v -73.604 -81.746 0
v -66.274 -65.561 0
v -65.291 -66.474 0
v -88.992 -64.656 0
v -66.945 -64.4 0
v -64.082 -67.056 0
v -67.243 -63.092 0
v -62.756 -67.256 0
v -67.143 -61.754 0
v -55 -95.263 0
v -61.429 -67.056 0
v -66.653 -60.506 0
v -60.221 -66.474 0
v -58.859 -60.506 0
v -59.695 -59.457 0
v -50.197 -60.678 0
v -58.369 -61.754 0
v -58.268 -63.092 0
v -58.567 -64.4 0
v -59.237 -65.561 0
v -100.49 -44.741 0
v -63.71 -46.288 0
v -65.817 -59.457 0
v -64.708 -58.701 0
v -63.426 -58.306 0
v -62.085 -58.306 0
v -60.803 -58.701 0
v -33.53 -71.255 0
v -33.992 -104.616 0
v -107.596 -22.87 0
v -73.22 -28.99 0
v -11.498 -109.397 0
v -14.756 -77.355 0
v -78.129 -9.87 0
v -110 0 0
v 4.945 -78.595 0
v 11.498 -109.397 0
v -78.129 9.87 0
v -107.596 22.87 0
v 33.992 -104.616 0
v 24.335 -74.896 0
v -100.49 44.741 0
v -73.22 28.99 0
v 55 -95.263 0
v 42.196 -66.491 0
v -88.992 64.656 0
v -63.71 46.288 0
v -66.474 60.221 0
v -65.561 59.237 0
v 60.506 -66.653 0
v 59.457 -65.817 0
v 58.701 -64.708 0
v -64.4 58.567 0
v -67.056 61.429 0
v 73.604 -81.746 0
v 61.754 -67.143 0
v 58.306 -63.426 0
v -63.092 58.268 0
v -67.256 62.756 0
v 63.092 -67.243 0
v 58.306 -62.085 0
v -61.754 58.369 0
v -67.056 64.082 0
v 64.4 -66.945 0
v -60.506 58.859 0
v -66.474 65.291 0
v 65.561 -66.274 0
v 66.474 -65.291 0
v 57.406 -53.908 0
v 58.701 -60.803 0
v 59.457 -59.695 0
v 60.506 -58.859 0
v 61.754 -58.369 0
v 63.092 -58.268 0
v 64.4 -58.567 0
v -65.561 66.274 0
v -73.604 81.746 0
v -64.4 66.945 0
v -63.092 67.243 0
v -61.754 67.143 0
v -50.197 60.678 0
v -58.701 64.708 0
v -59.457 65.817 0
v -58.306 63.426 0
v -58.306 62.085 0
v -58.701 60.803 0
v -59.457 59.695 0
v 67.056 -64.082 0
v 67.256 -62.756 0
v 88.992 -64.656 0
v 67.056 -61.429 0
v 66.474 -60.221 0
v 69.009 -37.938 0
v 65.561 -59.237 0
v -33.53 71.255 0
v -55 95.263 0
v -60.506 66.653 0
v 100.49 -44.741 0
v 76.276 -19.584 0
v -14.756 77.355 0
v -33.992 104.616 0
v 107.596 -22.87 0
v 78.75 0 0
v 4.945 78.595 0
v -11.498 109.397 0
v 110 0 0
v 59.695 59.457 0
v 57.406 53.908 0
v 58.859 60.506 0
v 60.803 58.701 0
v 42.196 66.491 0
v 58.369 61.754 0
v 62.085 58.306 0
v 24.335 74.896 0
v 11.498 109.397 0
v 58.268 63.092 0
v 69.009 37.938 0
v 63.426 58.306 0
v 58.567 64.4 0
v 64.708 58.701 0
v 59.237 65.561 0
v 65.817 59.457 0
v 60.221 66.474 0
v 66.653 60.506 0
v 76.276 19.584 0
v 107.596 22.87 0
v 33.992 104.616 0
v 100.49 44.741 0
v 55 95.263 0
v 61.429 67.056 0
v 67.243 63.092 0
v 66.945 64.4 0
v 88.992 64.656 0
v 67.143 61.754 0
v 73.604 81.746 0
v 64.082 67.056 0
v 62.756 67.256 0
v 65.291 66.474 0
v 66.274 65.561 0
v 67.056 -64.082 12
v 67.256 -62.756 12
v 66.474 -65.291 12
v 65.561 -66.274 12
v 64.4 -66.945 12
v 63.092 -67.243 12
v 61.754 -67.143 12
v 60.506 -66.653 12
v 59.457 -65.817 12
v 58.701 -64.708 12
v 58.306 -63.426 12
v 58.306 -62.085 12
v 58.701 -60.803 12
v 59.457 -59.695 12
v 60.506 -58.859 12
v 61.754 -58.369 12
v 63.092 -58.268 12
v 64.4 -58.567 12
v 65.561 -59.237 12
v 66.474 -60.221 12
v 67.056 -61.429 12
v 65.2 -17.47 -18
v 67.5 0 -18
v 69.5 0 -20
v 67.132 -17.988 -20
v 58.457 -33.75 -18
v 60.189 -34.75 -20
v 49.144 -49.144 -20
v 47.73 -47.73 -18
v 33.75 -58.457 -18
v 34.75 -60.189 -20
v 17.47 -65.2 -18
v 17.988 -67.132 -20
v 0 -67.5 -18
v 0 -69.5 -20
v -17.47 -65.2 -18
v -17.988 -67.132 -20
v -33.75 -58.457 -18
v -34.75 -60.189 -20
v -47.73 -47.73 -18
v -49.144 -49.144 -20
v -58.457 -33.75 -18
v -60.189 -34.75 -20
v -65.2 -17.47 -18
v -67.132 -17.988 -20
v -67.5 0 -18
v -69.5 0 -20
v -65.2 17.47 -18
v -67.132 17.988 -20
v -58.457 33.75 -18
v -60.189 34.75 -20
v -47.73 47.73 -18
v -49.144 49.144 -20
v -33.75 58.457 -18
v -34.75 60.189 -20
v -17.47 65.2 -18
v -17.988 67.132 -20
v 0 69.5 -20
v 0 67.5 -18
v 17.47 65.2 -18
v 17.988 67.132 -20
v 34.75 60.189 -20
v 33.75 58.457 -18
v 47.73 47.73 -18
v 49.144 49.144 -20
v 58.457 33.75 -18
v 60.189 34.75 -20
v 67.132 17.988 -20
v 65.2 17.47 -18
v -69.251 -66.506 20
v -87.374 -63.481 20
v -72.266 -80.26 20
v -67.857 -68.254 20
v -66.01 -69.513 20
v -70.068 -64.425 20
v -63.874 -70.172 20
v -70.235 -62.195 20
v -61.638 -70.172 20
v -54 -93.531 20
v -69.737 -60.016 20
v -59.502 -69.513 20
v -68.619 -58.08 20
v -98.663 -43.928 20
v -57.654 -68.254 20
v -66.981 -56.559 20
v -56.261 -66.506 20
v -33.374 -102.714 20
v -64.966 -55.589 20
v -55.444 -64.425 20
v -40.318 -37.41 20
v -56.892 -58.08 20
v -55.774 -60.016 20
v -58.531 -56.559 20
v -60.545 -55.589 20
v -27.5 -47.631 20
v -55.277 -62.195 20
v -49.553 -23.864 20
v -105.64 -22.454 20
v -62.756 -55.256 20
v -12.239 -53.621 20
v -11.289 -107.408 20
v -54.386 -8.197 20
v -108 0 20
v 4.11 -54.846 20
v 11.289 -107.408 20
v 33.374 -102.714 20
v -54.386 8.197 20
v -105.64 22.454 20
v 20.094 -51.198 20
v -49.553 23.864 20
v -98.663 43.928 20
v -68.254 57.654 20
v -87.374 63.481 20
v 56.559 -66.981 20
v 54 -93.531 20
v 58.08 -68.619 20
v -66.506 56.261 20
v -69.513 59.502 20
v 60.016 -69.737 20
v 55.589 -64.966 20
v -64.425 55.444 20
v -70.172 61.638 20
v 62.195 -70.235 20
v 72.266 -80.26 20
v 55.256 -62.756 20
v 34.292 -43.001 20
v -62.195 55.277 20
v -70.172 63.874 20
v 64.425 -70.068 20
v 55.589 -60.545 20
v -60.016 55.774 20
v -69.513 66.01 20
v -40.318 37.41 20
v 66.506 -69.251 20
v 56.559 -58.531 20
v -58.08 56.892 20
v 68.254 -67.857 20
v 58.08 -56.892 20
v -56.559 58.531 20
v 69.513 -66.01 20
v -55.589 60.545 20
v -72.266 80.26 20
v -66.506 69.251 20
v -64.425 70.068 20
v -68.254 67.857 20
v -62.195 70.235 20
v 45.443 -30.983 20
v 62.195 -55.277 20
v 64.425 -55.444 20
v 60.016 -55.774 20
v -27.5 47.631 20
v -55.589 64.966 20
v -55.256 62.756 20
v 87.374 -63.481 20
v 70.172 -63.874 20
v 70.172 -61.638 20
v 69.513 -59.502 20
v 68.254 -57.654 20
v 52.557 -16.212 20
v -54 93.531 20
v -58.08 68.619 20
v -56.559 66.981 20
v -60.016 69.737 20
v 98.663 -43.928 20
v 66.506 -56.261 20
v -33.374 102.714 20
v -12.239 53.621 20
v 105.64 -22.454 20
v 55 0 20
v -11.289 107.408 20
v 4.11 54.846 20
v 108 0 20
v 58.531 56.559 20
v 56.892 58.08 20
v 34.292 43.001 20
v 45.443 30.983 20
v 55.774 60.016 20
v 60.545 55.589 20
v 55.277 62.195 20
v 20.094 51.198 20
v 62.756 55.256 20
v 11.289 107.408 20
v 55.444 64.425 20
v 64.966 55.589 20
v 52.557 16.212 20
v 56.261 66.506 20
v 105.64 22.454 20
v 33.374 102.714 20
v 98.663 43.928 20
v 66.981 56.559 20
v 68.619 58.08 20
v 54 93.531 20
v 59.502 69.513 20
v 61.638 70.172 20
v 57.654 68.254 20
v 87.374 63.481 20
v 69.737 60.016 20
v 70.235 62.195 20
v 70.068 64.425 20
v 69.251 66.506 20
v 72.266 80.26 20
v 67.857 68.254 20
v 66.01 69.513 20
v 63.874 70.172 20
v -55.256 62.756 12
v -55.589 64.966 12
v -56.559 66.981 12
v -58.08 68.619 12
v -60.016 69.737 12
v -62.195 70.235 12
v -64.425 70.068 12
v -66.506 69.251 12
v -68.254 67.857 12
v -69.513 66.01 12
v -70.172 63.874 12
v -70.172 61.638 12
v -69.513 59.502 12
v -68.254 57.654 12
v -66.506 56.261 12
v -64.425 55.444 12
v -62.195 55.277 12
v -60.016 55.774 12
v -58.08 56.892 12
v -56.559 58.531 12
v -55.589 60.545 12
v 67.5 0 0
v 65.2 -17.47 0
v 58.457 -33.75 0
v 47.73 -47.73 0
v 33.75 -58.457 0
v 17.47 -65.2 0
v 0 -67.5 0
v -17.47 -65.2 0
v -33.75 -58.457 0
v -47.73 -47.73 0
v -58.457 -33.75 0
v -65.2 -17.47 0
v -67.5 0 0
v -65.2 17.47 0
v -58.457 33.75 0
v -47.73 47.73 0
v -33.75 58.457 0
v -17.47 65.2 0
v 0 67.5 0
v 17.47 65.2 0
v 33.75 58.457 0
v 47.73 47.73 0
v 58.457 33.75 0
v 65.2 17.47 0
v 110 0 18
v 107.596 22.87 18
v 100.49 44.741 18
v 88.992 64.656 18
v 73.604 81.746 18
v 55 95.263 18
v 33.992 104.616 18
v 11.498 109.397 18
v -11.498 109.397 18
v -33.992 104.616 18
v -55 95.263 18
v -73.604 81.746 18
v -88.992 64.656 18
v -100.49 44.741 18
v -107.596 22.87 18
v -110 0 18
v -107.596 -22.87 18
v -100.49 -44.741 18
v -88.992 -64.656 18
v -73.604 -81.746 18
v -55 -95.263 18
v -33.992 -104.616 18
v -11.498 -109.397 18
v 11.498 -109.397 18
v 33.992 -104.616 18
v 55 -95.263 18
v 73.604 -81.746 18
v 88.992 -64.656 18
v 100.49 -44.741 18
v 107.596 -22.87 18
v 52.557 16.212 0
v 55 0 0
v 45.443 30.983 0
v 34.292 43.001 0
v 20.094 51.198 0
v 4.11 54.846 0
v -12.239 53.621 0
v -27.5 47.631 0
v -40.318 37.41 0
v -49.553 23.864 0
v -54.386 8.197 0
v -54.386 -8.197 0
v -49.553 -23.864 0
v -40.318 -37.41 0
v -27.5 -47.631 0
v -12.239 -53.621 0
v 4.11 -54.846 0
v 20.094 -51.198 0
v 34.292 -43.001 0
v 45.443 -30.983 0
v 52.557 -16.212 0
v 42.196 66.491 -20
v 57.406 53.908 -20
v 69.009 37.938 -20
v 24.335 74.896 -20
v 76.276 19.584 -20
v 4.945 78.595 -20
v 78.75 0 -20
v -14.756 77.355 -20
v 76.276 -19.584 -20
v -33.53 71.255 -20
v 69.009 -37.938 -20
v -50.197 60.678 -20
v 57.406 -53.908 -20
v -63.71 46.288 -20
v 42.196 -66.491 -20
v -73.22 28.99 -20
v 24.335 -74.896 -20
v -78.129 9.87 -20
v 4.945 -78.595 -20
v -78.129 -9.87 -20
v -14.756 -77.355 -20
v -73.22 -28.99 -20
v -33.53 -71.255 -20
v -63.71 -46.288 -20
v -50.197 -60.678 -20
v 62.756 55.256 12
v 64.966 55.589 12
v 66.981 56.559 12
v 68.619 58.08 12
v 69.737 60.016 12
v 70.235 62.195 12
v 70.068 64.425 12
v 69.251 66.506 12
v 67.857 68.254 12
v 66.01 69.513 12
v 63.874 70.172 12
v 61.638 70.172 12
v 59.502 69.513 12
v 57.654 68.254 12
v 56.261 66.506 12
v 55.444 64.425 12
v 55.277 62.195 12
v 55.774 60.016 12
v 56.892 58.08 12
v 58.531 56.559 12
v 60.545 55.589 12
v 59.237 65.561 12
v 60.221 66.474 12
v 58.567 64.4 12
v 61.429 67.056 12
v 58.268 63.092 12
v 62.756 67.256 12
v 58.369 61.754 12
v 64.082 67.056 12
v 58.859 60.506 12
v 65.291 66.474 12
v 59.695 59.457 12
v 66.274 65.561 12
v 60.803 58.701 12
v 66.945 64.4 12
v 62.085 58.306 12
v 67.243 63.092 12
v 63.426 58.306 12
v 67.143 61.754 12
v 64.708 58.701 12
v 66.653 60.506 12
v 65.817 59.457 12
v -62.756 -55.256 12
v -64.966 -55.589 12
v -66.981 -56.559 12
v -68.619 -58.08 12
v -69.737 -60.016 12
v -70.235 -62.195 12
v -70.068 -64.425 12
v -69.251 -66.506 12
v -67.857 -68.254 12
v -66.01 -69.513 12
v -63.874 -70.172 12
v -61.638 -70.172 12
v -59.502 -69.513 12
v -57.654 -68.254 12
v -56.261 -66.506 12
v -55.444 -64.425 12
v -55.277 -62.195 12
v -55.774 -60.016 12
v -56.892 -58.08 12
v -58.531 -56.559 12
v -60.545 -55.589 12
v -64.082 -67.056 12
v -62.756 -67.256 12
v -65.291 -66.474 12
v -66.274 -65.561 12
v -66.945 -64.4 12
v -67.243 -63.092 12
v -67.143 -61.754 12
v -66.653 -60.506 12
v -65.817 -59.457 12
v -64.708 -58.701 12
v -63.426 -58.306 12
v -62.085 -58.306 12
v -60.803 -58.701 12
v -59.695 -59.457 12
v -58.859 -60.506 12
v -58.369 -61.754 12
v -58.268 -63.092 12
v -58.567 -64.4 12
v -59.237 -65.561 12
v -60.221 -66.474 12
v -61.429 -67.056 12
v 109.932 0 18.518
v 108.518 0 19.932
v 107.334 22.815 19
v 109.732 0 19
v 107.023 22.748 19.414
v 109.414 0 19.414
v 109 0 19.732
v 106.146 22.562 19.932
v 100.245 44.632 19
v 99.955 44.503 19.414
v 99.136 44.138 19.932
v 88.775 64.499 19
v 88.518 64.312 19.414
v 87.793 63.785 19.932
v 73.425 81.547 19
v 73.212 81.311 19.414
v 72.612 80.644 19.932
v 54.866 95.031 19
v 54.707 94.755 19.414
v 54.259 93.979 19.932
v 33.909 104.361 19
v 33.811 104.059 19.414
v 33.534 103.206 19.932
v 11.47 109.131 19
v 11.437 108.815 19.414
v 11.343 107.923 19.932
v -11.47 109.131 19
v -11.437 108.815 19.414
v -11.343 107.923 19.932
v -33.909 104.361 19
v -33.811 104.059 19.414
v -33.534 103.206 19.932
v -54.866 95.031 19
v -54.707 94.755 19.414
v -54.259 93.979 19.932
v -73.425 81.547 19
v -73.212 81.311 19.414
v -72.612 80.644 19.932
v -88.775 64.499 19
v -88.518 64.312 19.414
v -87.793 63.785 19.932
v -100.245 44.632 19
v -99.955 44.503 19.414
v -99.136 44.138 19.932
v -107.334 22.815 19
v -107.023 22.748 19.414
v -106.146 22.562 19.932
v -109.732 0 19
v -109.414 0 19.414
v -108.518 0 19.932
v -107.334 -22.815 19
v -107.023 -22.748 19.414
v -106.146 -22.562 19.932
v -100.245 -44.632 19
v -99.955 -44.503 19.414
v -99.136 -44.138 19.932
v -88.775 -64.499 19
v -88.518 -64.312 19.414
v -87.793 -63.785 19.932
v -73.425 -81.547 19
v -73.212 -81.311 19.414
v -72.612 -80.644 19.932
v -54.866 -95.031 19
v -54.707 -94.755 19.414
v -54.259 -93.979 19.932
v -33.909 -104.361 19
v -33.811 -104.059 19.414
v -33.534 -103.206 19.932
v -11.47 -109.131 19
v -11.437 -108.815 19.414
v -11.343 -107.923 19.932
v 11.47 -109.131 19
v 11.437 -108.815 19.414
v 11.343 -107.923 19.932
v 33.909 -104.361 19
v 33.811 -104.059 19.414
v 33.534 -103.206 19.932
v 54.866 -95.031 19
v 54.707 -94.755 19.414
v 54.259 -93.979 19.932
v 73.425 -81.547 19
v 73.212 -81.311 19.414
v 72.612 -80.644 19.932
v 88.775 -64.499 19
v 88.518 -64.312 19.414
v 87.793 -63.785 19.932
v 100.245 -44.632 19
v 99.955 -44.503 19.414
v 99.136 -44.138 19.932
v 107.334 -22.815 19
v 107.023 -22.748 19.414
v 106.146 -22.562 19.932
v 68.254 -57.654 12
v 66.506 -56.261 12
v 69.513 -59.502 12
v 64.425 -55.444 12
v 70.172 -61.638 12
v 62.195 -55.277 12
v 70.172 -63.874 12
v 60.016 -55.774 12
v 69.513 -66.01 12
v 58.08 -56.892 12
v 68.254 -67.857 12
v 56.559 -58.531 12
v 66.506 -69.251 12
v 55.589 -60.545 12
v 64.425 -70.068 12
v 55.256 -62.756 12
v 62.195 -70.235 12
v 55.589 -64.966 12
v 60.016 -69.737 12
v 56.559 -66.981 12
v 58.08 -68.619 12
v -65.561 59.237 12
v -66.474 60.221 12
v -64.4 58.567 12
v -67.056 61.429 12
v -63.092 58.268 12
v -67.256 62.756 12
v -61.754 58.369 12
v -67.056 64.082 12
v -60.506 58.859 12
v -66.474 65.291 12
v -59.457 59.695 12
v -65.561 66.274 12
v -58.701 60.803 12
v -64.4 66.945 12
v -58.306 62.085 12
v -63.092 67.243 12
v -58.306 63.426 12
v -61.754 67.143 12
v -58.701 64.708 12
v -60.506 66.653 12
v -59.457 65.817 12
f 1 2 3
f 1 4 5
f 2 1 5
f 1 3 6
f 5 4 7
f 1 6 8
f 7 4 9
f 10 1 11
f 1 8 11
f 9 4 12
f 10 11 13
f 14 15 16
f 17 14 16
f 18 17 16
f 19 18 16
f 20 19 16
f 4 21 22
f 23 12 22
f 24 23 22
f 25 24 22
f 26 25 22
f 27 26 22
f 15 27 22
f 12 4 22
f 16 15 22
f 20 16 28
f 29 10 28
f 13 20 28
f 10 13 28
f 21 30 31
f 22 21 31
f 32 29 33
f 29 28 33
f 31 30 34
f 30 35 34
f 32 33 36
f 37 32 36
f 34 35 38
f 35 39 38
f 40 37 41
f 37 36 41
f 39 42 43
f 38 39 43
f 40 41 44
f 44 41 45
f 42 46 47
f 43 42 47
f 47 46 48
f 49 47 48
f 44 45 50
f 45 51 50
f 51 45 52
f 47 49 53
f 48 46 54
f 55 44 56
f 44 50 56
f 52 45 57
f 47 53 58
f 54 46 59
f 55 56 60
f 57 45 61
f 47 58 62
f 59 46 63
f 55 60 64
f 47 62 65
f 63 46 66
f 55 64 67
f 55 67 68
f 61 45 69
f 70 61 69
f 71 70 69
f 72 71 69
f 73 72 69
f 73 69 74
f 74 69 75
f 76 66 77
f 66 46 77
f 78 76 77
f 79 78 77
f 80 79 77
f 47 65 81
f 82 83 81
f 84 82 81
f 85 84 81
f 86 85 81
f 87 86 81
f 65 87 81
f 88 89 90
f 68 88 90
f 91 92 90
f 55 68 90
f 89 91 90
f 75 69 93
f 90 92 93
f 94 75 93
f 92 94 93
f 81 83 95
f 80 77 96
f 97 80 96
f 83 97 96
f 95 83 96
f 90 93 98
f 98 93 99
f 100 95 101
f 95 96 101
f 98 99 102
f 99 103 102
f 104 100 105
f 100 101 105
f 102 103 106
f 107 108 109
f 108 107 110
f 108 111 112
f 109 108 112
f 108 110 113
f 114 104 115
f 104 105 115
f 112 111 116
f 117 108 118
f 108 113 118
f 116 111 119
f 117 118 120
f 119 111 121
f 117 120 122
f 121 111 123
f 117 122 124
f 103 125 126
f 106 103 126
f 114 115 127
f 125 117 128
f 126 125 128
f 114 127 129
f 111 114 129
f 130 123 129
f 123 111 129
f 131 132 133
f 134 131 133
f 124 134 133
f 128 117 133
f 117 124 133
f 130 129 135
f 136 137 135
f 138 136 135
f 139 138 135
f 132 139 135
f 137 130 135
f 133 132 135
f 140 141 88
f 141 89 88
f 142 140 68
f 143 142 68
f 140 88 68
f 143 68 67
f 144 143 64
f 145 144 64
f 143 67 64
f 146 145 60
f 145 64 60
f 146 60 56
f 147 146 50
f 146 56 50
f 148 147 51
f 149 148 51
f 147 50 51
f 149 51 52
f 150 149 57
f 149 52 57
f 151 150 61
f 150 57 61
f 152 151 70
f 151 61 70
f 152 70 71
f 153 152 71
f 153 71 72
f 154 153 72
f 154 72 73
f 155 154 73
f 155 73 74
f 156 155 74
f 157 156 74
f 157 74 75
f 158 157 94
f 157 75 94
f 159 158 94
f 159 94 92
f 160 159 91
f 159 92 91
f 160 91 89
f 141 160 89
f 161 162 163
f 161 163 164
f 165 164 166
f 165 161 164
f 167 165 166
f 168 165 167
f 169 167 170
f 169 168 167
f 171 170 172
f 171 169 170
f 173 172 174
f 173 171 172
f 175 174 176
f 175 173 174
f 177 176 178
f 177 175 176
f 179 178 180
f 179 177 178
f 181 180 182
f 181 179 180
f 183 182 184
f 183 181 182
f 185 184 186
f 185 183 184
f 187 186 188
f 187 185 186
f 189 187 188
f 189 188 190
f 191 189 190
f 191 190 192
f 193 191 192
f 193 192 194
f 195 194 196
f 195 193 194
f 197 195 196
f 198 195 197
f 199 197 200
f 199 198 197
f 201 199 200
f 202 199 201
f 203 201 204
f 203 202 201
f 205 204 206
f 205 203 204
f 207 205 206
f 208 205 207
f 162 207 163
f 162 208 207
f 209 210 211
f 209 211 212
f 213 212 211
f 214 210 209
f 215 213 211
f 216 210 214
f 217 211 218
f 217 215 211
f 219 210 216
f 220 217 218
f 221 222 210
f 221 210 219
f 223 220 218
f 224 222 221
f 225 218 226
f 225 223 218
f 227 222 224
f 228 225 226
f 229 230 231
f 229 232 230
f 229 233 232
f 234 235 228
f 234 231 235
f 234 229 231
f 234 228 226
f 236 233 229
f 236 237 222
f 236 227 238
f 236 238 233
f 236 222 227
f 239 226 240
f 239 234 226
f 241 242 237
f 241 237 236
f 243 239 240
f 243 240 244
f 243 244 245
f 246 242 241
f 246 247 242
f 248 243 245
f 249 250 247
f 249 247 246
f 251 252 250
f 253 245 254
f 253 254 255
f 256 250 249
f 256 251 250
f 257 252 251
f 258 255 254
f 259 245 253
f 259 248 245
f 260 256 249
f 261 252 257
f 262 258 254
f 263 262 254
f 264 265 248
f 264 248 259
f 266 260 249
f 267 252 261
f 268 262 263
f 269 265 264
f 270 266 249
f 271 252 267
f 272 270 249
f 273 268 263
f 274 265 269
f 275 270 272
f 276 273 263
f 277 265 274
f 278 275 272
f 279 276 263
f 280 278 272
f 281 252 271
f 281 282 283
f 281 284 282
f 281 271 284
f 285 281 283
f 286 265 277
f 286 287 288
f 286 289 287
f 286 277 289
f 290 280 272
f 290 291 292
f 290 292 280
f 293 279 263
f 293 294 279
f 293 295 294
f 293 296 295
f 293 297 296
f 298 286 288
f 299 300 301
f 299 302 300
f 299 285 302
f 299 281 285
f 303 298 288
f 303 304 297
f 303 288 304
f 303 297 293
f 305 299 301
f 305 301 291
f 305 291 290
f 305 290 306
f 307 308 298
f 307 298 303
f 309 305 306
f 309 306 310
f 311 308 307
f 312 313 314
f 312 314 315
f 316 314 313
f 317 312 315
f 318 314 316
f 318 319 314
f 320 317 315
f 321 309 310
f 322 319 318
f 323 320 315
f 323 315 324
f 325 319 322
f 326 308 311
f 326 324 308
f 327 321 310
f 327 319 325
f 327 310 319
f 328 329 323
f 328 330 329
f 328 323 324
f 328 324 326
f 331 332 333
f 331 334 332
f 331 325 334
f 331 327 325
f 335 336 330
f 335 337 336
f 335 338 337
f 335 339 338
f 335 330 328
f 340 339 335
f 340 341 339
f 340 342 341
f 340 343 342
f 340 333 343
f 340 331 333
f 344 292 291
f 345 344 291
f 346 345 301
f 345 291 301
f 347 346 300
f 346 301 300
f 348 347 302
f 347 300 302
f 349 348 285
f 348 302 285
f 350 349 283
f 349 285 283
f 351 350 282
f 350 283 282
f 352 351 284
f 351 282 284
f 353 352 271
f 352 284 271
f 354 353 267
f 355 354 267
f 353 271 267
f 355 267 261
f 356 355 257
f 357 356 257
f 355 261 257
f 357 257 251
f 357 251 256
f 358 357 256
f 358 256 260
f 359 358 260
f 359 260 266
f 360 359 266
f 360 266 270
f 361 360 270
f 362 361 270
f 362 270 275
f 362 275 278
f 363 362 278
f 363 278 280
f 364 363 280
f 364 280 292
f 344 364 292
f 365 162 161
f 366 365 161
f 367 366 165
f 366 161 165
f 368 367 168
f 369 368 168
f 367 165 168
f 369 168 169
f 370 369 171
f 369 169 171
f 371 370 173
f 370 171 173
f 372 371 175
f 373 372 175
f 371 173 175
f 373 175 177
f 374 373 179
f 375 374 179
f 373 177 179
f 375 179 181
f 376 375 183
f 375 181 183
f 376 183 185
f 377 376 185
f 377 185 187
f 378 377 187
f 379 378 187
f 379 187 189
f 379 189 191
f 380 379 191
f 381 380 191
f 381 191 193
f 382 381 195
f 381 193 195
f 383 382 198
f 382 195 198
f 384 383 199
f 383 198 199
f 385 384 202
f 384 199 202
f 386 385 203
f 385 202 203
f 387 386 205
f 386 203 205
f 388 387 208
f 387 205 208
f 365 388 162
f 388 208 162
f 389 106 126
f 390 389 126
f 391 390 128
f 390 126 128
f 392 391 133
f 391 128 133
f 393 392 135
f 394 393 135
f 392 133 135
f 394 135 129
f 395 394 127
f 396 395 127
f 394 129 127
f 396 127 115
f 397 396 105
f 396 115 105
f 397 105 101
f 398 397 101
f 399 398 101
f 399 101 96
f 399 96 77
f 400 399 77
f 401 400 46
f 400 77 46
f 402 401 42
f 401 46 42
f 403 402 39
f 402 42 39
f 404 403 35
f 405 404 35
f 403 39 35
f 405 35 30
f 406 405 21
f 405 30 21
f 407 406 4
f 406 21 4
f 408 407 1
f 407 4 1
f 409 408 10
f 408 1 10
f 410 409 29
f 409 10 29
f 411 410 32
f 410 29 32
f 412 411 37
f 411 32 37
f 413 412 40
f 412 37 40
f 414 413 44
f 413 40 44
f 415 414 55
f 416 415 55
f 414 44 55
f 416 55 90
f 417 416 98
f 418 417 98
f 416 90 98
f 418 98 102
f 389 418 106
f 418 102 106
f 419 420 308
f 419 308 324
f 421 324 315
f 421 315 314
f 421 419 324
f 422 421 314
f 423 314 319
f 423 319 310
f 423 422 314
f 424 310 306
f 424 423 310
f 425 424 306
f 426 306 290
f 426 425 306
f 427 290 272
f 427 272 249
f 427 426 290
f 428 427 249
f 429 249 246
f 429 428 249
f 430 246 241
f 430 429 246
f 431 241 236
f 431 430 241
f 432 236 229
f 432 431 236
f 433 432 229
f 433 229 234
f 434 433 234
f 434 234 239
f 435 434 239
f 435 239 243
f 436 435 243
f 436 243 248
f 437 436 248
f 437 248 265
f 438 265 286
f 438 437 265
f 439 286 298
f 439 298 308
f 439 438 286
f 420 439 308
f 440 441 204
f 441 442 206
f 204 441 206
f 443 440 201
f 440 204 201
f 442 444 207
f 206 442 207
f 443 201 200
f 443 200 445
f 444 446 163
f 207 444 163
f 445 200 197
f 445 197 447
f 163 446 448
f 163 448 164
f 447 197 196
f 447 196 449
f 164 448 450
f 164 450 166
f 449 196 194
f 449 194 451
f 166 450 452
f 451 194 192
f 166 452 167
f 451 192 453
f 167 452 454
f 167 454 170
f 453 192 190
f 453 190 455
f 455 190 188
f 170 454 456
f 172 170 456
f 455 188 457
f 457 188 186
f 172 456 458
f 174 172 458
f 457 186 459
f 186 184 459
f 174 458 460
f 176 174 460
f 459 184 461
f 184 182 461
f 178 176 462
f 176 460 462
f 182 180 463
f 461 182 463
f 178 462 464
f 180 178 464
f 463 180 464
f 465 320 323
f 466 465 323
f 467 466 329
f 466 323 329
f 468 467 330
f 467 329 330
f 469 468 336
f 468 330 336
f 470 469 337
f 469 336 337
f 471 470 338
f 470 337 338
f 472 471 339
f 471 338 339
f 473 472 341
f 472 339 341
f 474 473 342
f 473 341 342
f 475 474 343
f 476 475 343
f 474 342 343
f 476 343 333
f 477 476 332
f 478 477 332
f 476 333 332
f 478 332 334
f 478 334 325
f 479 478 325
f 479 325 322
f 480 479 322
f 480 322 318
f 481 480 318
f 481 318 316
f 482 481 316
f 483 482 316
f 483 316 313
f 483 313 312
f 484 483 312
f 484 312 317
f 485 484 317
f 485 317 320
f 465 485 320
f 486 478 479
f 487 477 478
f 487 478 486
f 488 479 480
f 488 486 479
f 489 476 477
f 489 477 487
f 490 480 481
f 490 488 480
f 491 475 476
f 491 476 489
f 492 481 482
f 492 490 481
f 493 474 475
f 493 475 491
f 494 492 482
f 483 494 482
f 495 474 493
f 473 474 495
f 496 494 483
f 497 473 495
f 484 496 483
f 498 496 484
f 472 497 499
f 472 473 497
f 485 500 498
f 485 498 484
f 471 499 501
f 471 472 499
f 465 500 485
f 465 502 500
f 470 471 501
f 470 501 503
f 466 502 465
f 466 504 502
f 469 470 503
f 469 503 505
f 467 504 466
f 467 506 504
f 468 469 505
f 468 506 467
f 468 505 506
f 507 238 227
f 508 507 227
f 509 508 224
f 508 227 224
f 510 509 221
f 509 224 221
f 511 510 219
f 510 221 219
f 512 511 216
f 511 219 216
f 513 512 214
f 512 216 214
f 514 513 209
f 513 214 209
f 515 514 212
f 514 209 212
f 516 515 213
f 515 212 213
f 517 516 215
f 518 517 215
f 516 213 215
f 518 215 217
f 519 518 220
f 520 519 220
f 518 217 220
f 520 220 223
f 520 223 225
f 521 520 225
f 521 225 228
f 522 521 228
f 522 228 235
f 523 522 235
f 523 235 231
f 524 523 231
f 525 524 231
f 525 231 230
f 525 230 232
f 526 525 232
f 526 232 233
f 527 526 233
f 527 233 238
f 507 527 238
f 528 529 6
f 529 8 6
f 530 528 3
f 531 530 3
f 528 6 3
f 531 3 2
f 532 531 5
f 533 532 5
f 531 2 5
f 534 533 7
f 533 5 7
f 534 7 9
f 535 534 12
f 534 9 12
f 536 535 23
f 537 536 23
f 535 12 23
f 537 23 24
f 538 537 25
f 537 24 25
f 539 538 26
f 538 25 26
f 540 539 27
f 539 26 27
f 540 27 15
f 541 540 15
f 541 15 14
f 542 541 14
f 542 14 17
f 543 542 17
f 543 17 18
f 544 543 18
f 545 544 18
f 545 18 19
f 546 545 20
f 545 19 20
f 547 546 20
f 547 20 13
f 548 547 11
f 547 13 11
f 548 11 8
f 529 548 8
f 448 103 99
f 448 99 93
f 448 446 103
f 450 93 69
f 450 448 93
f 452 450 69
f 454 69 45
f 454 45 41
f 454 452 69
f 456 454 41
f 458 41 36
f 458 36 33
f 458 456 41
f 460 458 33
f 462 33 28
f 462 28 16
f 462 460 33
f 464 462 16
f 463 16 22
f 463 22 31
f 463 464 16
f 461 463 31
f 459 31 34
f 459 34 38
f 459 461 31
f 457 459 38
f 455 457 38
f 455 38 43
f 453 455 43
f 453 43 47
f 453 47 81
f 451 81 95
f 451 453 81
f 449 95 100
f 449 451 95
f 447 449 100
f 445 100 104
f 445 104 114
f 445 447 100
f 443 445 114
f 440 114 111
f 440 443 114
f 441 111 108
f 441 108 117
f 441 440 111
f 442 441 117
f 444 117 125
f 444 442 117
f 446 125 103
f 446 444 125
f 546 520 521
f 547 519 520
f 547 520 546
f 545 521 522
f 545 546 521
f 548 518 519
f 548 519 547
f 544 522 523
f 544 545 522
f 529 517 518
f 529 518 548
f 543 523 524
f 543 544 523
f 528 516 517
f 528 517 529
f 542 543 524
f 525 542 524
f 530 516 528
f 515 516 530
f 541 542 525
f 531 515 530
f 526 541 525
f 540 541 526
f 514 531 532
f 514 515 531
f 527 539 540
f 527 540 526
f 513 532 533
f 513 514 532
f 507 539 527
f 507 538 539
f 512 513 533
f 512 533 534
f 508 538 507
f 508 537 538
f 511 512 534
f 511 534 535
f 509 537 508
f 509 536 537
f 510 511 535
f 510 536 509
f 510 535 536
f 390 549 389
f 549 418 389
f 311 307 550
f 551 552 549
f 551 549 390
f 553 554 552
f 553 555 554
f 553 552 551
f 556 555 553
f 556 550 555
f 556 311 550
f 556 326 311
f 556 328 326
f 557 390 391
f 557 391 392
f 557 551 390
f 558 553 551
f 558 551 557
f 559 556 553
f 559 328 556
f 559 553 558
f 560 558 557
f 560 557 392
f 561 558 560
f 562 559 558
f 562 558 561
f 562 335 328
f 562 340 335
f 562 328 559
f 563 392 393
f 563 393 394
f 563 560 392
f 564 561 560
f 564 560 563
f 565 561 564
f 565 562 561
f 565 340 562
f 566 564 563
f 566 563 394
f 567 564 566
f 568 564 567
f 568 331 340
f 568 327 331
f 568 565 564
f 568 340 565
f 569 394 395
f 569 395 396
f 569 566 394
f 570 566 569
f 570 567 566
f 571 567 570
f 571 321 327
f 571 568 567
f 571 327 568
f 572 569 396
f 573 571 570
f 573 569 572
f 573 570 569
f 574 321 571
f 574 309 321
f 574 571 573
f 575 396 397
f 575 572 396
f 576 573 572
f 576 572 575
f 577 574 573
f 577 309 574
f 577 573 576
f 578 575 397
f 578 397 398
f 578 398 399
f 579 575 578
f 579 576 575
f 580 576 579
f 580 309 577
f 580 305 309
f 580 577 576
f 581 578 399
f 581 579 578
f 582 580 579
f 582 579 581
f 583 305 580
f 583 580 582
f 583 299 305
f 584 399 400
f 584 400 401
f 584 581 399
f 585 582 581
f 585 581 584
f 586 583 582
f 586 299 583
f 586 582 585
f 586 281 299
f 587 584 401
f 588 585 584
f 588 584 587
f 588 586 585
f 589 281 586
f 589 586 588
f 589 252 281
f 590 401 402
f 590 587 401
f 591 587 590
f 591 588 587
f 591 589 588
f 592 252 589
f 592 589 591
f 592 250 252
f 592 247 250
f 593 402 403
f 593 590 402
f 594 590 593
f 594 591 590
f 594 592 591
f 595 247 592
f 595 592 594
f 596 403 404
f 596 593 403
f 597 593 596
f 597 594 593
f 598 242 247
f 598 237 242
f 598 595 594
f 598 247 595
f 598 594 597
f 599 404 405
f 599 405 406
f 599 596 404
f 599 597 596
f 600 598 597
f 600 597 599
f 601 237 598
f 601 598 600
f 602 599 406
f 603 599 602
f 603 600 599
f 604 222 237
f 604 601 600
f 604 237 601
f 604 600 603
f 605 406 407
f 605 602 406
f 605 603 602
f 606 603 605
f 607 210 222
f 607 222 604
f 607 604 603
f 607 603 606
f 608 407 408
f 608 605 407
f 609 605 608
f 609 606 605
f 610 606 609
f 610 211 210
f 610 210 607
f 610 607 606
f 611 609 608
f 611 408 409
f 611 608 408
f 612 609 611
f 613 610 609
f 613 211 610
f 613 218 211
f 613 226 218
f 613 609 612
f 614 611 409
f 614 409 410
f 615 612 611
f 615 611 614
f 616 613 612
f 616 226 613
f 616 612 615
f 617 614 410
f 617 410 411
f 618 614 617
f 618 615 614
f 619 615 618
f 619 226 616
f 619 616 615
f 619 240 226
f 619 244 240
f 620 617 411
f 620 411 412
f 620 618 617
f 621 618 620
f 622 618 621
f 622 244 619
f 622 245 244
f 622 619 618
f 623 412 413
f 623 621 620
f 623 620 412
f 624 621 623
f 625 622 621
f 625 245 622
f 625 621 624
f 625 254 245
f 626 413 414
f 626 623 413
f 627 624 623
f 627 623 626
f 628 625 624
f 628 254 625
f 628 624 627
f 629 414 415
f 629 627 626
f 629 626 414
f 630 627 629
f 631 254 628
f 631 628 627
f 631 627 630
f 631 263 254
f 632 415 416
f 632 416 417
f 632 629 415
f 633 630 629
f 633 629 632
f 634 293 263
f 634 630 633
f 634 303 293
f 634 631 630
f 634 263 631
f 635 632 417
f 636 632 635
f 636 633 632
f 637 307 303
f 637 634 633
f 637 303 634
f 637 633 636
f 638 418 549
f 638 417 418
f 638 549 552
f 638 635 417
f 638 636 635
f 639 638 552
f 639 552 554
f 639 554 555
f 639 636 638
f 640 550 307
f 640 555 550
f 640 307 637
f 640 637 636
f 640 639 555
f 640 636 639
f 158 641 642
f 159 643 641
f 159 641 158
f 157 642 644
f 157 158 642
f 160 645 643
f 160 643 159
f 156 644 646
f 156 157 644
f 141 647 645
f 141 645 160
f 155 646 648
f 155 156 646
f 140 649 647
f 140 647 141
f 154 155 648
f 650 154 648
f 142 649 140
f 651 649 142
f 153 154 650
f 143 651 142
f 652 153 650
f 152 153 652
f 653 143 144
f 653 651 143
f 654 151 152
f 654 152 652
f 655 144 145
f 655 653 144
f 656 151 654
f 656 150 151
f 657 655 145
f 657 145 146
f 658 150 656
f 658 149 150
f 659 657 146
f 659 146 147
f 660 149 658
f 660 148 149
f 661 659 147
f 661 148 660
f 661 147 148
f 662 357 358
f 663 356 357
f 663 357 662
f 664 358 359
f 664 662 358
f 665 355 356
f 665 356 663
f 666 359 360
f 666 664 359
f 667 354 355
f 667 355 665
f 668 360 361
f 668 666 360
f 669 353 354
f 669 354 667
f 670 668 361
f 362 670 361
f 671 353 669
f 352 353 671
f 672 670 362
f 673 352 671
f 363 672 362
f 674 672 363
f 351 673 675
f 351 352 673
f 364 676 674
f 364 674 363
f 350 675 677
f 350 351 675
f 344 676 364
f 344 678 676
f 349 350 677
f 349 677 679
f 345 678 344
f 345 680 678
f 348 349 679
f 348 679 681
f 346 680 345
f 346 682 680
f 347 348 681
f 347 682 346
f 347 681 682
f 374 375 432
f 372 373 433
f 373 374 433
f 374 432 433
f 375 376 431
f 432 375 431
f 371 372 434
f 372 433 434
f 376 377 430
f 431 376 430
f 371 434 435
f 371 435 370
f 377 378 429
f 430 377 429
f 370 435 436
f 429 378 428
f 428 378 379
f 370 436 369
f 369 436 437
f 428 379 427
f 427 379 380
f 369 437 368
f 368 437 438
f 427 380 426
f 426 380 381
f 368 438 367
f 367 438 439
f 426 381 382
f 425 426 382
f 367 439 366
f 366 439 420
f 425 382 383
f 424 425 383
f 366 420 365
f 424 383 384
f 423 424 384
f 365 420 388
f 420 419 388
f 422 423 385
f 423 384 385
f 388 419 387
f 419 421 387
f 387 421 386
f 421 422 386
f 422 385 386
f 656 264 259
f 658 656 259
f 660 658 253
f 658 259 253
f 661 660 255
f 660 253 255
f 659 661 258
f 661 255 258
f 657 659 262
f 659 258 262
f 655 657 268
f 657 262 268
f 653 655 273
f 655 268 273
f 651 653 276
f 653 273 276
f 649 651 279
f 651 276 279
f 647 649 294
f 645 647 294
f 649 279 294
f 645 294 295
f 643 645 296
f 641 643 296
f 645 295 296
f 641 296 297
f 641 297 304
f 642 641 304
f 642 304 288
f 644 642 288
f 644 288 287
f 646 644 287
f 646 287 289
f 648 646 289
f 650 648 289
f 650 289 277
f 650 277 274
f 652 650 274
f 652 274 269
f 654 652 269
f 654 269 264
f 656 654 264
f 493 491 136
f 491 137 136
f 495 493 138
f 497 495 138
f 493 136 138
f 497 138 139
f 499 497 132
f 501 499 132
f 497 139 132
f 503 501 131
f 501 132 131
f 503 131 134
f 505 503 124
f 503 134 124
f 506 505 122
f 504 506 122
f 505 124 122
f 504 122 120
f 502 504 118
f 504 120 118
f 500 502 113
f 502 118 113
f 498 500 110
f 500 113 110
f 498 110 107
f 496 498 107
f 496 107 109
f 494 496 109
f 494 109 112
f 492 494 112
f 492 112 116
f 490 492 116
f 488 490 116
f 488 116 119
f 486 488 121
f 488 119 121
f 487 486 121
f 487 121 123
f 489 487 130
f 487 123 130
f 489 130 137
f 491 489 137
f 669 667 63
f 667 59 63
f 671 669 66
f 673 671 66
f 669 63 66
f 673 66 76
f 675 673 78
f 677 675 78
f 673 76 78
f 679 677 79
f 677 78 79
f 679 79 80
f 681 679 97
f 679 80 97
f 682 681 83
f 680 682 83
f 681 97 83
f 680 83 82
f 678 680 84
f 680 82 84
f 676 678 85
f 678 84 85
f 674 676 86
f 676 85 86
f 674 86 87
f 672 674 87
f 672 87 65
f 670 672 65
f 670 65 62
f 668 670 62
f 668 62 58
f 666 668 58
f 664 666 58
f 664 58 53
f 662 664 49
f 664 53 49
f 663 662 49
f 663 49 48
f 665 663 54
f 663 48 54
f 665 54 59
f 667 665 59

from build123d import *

# Parameters (mm, degrees)
SCHIZZO1_R                                           = 110
SCHIZZO1_R_2                                         = 55
ESTRUSIONE_ESTRUSIONE1_DEPTH                         = 20
SCHIZZO2_W                                           = 20
SCHIZZO2_H                                           = 11.25
RACCORDO1_R                                          = 2
SMUSSO1_SIZE                                         = 2
FORO_LAMATO_PER_VITE_M8_A_TESTA_CILINDRI_D           = 9
FORO_LAMATO_PER_VITE_M8_A_TESTA_CILINDRI_CBORE_D     = 15
FORO_LAMATO_PER_VITE_M8_A_TESTA_CILINDRI_CBORE_DEPTH = 8
RIPETIZIONECIRCOLARE1_COUNT                          = 4


with BuildPart() as part:
    # Schizzo1 → Estrusione-Estrusione1 (new body)
    with BuildSketch(Plane.XY):
        Circle(SCHIZZO1_R)
        Circle(SCHIZZO1_R_2, mode=Mode.SUBTRACT)
    extrude(amount=ESTRUSIONE_ESTRUSIONE1_DEPTH)

    # Schizzo2 → Rivoluzione1 (revolve)
    with BuildSketch(Plane(origin=(0, 0, 0), x_dir=(0, 0, -1), z_dir=(1, 0, 0)), mode=Mode.PRIVATE) as rivoluzione1_sk:
        with Locations((10, 73.125)):
            Rectangle(SCHIZZO2_W, SCHIZZO2_H)
    revolve(rivoluzione1_sk.sketch.rotate(Axis((0, 0, 0), (0, 0, -1)), 90), axis=Axis((0, 0, 0), (0, 0, -1)))

    # Raccordo1
    raccordo1_edges = [part.edges().sort_by_distance(p)[0] for p in [
        (-110, 0, 20),
    ]]
    fillet(raccordo1_edges, radius=RACCORDO1_R)

    # Smusso1
    smusso1_edges = [part.edges().sort_by_distance(p)[0] for p in [
        (-67.5, 0, -20),
    ]]
    chamfer(smusso1_edges, length=SMUSSO1_SIZE)

    # Foro lamato per Vite M8 a testa cilindrica piana-1 (through all)
    with Locations(Plane.XY.offset(20)):
        with Locations((-62.75572683, 62.75572683)):
            foro_lamato_per_vite_m8_a_testa_cilindri = CounterBoreHole(FORO_LAMATO_PER_VITE_M8_A_TESTA_CILINDRI_D / 2, FORO_LAMATO_PER_VITE_M8_A_TESTA_CILINDRI_CBORE_D / 2, FORO_LAMATO_PER_VITE_M8_A_TESTA_CILINDRI_CBORE_DEPTH)

    # RipetizioneCircolare1: Foro lamato per Vite M8 a testa cilindrica piana-1 ×4 about axis
    ripetizionecircolare1_axis = Axis((0, 0, 0), (0, 0, 1))
    for i in range(1, RIPETIZIONECIRCOLARE1_COUNT):
        add(foro_lamato_per_vite_m8_a_testa_cilindri.rotate(ripetizionecircolare1_axis, i * 360 / RIPETIZIONECIRCOLARE1_COUNT), mode=Mode.SUBTRACT)


solid = part.part
